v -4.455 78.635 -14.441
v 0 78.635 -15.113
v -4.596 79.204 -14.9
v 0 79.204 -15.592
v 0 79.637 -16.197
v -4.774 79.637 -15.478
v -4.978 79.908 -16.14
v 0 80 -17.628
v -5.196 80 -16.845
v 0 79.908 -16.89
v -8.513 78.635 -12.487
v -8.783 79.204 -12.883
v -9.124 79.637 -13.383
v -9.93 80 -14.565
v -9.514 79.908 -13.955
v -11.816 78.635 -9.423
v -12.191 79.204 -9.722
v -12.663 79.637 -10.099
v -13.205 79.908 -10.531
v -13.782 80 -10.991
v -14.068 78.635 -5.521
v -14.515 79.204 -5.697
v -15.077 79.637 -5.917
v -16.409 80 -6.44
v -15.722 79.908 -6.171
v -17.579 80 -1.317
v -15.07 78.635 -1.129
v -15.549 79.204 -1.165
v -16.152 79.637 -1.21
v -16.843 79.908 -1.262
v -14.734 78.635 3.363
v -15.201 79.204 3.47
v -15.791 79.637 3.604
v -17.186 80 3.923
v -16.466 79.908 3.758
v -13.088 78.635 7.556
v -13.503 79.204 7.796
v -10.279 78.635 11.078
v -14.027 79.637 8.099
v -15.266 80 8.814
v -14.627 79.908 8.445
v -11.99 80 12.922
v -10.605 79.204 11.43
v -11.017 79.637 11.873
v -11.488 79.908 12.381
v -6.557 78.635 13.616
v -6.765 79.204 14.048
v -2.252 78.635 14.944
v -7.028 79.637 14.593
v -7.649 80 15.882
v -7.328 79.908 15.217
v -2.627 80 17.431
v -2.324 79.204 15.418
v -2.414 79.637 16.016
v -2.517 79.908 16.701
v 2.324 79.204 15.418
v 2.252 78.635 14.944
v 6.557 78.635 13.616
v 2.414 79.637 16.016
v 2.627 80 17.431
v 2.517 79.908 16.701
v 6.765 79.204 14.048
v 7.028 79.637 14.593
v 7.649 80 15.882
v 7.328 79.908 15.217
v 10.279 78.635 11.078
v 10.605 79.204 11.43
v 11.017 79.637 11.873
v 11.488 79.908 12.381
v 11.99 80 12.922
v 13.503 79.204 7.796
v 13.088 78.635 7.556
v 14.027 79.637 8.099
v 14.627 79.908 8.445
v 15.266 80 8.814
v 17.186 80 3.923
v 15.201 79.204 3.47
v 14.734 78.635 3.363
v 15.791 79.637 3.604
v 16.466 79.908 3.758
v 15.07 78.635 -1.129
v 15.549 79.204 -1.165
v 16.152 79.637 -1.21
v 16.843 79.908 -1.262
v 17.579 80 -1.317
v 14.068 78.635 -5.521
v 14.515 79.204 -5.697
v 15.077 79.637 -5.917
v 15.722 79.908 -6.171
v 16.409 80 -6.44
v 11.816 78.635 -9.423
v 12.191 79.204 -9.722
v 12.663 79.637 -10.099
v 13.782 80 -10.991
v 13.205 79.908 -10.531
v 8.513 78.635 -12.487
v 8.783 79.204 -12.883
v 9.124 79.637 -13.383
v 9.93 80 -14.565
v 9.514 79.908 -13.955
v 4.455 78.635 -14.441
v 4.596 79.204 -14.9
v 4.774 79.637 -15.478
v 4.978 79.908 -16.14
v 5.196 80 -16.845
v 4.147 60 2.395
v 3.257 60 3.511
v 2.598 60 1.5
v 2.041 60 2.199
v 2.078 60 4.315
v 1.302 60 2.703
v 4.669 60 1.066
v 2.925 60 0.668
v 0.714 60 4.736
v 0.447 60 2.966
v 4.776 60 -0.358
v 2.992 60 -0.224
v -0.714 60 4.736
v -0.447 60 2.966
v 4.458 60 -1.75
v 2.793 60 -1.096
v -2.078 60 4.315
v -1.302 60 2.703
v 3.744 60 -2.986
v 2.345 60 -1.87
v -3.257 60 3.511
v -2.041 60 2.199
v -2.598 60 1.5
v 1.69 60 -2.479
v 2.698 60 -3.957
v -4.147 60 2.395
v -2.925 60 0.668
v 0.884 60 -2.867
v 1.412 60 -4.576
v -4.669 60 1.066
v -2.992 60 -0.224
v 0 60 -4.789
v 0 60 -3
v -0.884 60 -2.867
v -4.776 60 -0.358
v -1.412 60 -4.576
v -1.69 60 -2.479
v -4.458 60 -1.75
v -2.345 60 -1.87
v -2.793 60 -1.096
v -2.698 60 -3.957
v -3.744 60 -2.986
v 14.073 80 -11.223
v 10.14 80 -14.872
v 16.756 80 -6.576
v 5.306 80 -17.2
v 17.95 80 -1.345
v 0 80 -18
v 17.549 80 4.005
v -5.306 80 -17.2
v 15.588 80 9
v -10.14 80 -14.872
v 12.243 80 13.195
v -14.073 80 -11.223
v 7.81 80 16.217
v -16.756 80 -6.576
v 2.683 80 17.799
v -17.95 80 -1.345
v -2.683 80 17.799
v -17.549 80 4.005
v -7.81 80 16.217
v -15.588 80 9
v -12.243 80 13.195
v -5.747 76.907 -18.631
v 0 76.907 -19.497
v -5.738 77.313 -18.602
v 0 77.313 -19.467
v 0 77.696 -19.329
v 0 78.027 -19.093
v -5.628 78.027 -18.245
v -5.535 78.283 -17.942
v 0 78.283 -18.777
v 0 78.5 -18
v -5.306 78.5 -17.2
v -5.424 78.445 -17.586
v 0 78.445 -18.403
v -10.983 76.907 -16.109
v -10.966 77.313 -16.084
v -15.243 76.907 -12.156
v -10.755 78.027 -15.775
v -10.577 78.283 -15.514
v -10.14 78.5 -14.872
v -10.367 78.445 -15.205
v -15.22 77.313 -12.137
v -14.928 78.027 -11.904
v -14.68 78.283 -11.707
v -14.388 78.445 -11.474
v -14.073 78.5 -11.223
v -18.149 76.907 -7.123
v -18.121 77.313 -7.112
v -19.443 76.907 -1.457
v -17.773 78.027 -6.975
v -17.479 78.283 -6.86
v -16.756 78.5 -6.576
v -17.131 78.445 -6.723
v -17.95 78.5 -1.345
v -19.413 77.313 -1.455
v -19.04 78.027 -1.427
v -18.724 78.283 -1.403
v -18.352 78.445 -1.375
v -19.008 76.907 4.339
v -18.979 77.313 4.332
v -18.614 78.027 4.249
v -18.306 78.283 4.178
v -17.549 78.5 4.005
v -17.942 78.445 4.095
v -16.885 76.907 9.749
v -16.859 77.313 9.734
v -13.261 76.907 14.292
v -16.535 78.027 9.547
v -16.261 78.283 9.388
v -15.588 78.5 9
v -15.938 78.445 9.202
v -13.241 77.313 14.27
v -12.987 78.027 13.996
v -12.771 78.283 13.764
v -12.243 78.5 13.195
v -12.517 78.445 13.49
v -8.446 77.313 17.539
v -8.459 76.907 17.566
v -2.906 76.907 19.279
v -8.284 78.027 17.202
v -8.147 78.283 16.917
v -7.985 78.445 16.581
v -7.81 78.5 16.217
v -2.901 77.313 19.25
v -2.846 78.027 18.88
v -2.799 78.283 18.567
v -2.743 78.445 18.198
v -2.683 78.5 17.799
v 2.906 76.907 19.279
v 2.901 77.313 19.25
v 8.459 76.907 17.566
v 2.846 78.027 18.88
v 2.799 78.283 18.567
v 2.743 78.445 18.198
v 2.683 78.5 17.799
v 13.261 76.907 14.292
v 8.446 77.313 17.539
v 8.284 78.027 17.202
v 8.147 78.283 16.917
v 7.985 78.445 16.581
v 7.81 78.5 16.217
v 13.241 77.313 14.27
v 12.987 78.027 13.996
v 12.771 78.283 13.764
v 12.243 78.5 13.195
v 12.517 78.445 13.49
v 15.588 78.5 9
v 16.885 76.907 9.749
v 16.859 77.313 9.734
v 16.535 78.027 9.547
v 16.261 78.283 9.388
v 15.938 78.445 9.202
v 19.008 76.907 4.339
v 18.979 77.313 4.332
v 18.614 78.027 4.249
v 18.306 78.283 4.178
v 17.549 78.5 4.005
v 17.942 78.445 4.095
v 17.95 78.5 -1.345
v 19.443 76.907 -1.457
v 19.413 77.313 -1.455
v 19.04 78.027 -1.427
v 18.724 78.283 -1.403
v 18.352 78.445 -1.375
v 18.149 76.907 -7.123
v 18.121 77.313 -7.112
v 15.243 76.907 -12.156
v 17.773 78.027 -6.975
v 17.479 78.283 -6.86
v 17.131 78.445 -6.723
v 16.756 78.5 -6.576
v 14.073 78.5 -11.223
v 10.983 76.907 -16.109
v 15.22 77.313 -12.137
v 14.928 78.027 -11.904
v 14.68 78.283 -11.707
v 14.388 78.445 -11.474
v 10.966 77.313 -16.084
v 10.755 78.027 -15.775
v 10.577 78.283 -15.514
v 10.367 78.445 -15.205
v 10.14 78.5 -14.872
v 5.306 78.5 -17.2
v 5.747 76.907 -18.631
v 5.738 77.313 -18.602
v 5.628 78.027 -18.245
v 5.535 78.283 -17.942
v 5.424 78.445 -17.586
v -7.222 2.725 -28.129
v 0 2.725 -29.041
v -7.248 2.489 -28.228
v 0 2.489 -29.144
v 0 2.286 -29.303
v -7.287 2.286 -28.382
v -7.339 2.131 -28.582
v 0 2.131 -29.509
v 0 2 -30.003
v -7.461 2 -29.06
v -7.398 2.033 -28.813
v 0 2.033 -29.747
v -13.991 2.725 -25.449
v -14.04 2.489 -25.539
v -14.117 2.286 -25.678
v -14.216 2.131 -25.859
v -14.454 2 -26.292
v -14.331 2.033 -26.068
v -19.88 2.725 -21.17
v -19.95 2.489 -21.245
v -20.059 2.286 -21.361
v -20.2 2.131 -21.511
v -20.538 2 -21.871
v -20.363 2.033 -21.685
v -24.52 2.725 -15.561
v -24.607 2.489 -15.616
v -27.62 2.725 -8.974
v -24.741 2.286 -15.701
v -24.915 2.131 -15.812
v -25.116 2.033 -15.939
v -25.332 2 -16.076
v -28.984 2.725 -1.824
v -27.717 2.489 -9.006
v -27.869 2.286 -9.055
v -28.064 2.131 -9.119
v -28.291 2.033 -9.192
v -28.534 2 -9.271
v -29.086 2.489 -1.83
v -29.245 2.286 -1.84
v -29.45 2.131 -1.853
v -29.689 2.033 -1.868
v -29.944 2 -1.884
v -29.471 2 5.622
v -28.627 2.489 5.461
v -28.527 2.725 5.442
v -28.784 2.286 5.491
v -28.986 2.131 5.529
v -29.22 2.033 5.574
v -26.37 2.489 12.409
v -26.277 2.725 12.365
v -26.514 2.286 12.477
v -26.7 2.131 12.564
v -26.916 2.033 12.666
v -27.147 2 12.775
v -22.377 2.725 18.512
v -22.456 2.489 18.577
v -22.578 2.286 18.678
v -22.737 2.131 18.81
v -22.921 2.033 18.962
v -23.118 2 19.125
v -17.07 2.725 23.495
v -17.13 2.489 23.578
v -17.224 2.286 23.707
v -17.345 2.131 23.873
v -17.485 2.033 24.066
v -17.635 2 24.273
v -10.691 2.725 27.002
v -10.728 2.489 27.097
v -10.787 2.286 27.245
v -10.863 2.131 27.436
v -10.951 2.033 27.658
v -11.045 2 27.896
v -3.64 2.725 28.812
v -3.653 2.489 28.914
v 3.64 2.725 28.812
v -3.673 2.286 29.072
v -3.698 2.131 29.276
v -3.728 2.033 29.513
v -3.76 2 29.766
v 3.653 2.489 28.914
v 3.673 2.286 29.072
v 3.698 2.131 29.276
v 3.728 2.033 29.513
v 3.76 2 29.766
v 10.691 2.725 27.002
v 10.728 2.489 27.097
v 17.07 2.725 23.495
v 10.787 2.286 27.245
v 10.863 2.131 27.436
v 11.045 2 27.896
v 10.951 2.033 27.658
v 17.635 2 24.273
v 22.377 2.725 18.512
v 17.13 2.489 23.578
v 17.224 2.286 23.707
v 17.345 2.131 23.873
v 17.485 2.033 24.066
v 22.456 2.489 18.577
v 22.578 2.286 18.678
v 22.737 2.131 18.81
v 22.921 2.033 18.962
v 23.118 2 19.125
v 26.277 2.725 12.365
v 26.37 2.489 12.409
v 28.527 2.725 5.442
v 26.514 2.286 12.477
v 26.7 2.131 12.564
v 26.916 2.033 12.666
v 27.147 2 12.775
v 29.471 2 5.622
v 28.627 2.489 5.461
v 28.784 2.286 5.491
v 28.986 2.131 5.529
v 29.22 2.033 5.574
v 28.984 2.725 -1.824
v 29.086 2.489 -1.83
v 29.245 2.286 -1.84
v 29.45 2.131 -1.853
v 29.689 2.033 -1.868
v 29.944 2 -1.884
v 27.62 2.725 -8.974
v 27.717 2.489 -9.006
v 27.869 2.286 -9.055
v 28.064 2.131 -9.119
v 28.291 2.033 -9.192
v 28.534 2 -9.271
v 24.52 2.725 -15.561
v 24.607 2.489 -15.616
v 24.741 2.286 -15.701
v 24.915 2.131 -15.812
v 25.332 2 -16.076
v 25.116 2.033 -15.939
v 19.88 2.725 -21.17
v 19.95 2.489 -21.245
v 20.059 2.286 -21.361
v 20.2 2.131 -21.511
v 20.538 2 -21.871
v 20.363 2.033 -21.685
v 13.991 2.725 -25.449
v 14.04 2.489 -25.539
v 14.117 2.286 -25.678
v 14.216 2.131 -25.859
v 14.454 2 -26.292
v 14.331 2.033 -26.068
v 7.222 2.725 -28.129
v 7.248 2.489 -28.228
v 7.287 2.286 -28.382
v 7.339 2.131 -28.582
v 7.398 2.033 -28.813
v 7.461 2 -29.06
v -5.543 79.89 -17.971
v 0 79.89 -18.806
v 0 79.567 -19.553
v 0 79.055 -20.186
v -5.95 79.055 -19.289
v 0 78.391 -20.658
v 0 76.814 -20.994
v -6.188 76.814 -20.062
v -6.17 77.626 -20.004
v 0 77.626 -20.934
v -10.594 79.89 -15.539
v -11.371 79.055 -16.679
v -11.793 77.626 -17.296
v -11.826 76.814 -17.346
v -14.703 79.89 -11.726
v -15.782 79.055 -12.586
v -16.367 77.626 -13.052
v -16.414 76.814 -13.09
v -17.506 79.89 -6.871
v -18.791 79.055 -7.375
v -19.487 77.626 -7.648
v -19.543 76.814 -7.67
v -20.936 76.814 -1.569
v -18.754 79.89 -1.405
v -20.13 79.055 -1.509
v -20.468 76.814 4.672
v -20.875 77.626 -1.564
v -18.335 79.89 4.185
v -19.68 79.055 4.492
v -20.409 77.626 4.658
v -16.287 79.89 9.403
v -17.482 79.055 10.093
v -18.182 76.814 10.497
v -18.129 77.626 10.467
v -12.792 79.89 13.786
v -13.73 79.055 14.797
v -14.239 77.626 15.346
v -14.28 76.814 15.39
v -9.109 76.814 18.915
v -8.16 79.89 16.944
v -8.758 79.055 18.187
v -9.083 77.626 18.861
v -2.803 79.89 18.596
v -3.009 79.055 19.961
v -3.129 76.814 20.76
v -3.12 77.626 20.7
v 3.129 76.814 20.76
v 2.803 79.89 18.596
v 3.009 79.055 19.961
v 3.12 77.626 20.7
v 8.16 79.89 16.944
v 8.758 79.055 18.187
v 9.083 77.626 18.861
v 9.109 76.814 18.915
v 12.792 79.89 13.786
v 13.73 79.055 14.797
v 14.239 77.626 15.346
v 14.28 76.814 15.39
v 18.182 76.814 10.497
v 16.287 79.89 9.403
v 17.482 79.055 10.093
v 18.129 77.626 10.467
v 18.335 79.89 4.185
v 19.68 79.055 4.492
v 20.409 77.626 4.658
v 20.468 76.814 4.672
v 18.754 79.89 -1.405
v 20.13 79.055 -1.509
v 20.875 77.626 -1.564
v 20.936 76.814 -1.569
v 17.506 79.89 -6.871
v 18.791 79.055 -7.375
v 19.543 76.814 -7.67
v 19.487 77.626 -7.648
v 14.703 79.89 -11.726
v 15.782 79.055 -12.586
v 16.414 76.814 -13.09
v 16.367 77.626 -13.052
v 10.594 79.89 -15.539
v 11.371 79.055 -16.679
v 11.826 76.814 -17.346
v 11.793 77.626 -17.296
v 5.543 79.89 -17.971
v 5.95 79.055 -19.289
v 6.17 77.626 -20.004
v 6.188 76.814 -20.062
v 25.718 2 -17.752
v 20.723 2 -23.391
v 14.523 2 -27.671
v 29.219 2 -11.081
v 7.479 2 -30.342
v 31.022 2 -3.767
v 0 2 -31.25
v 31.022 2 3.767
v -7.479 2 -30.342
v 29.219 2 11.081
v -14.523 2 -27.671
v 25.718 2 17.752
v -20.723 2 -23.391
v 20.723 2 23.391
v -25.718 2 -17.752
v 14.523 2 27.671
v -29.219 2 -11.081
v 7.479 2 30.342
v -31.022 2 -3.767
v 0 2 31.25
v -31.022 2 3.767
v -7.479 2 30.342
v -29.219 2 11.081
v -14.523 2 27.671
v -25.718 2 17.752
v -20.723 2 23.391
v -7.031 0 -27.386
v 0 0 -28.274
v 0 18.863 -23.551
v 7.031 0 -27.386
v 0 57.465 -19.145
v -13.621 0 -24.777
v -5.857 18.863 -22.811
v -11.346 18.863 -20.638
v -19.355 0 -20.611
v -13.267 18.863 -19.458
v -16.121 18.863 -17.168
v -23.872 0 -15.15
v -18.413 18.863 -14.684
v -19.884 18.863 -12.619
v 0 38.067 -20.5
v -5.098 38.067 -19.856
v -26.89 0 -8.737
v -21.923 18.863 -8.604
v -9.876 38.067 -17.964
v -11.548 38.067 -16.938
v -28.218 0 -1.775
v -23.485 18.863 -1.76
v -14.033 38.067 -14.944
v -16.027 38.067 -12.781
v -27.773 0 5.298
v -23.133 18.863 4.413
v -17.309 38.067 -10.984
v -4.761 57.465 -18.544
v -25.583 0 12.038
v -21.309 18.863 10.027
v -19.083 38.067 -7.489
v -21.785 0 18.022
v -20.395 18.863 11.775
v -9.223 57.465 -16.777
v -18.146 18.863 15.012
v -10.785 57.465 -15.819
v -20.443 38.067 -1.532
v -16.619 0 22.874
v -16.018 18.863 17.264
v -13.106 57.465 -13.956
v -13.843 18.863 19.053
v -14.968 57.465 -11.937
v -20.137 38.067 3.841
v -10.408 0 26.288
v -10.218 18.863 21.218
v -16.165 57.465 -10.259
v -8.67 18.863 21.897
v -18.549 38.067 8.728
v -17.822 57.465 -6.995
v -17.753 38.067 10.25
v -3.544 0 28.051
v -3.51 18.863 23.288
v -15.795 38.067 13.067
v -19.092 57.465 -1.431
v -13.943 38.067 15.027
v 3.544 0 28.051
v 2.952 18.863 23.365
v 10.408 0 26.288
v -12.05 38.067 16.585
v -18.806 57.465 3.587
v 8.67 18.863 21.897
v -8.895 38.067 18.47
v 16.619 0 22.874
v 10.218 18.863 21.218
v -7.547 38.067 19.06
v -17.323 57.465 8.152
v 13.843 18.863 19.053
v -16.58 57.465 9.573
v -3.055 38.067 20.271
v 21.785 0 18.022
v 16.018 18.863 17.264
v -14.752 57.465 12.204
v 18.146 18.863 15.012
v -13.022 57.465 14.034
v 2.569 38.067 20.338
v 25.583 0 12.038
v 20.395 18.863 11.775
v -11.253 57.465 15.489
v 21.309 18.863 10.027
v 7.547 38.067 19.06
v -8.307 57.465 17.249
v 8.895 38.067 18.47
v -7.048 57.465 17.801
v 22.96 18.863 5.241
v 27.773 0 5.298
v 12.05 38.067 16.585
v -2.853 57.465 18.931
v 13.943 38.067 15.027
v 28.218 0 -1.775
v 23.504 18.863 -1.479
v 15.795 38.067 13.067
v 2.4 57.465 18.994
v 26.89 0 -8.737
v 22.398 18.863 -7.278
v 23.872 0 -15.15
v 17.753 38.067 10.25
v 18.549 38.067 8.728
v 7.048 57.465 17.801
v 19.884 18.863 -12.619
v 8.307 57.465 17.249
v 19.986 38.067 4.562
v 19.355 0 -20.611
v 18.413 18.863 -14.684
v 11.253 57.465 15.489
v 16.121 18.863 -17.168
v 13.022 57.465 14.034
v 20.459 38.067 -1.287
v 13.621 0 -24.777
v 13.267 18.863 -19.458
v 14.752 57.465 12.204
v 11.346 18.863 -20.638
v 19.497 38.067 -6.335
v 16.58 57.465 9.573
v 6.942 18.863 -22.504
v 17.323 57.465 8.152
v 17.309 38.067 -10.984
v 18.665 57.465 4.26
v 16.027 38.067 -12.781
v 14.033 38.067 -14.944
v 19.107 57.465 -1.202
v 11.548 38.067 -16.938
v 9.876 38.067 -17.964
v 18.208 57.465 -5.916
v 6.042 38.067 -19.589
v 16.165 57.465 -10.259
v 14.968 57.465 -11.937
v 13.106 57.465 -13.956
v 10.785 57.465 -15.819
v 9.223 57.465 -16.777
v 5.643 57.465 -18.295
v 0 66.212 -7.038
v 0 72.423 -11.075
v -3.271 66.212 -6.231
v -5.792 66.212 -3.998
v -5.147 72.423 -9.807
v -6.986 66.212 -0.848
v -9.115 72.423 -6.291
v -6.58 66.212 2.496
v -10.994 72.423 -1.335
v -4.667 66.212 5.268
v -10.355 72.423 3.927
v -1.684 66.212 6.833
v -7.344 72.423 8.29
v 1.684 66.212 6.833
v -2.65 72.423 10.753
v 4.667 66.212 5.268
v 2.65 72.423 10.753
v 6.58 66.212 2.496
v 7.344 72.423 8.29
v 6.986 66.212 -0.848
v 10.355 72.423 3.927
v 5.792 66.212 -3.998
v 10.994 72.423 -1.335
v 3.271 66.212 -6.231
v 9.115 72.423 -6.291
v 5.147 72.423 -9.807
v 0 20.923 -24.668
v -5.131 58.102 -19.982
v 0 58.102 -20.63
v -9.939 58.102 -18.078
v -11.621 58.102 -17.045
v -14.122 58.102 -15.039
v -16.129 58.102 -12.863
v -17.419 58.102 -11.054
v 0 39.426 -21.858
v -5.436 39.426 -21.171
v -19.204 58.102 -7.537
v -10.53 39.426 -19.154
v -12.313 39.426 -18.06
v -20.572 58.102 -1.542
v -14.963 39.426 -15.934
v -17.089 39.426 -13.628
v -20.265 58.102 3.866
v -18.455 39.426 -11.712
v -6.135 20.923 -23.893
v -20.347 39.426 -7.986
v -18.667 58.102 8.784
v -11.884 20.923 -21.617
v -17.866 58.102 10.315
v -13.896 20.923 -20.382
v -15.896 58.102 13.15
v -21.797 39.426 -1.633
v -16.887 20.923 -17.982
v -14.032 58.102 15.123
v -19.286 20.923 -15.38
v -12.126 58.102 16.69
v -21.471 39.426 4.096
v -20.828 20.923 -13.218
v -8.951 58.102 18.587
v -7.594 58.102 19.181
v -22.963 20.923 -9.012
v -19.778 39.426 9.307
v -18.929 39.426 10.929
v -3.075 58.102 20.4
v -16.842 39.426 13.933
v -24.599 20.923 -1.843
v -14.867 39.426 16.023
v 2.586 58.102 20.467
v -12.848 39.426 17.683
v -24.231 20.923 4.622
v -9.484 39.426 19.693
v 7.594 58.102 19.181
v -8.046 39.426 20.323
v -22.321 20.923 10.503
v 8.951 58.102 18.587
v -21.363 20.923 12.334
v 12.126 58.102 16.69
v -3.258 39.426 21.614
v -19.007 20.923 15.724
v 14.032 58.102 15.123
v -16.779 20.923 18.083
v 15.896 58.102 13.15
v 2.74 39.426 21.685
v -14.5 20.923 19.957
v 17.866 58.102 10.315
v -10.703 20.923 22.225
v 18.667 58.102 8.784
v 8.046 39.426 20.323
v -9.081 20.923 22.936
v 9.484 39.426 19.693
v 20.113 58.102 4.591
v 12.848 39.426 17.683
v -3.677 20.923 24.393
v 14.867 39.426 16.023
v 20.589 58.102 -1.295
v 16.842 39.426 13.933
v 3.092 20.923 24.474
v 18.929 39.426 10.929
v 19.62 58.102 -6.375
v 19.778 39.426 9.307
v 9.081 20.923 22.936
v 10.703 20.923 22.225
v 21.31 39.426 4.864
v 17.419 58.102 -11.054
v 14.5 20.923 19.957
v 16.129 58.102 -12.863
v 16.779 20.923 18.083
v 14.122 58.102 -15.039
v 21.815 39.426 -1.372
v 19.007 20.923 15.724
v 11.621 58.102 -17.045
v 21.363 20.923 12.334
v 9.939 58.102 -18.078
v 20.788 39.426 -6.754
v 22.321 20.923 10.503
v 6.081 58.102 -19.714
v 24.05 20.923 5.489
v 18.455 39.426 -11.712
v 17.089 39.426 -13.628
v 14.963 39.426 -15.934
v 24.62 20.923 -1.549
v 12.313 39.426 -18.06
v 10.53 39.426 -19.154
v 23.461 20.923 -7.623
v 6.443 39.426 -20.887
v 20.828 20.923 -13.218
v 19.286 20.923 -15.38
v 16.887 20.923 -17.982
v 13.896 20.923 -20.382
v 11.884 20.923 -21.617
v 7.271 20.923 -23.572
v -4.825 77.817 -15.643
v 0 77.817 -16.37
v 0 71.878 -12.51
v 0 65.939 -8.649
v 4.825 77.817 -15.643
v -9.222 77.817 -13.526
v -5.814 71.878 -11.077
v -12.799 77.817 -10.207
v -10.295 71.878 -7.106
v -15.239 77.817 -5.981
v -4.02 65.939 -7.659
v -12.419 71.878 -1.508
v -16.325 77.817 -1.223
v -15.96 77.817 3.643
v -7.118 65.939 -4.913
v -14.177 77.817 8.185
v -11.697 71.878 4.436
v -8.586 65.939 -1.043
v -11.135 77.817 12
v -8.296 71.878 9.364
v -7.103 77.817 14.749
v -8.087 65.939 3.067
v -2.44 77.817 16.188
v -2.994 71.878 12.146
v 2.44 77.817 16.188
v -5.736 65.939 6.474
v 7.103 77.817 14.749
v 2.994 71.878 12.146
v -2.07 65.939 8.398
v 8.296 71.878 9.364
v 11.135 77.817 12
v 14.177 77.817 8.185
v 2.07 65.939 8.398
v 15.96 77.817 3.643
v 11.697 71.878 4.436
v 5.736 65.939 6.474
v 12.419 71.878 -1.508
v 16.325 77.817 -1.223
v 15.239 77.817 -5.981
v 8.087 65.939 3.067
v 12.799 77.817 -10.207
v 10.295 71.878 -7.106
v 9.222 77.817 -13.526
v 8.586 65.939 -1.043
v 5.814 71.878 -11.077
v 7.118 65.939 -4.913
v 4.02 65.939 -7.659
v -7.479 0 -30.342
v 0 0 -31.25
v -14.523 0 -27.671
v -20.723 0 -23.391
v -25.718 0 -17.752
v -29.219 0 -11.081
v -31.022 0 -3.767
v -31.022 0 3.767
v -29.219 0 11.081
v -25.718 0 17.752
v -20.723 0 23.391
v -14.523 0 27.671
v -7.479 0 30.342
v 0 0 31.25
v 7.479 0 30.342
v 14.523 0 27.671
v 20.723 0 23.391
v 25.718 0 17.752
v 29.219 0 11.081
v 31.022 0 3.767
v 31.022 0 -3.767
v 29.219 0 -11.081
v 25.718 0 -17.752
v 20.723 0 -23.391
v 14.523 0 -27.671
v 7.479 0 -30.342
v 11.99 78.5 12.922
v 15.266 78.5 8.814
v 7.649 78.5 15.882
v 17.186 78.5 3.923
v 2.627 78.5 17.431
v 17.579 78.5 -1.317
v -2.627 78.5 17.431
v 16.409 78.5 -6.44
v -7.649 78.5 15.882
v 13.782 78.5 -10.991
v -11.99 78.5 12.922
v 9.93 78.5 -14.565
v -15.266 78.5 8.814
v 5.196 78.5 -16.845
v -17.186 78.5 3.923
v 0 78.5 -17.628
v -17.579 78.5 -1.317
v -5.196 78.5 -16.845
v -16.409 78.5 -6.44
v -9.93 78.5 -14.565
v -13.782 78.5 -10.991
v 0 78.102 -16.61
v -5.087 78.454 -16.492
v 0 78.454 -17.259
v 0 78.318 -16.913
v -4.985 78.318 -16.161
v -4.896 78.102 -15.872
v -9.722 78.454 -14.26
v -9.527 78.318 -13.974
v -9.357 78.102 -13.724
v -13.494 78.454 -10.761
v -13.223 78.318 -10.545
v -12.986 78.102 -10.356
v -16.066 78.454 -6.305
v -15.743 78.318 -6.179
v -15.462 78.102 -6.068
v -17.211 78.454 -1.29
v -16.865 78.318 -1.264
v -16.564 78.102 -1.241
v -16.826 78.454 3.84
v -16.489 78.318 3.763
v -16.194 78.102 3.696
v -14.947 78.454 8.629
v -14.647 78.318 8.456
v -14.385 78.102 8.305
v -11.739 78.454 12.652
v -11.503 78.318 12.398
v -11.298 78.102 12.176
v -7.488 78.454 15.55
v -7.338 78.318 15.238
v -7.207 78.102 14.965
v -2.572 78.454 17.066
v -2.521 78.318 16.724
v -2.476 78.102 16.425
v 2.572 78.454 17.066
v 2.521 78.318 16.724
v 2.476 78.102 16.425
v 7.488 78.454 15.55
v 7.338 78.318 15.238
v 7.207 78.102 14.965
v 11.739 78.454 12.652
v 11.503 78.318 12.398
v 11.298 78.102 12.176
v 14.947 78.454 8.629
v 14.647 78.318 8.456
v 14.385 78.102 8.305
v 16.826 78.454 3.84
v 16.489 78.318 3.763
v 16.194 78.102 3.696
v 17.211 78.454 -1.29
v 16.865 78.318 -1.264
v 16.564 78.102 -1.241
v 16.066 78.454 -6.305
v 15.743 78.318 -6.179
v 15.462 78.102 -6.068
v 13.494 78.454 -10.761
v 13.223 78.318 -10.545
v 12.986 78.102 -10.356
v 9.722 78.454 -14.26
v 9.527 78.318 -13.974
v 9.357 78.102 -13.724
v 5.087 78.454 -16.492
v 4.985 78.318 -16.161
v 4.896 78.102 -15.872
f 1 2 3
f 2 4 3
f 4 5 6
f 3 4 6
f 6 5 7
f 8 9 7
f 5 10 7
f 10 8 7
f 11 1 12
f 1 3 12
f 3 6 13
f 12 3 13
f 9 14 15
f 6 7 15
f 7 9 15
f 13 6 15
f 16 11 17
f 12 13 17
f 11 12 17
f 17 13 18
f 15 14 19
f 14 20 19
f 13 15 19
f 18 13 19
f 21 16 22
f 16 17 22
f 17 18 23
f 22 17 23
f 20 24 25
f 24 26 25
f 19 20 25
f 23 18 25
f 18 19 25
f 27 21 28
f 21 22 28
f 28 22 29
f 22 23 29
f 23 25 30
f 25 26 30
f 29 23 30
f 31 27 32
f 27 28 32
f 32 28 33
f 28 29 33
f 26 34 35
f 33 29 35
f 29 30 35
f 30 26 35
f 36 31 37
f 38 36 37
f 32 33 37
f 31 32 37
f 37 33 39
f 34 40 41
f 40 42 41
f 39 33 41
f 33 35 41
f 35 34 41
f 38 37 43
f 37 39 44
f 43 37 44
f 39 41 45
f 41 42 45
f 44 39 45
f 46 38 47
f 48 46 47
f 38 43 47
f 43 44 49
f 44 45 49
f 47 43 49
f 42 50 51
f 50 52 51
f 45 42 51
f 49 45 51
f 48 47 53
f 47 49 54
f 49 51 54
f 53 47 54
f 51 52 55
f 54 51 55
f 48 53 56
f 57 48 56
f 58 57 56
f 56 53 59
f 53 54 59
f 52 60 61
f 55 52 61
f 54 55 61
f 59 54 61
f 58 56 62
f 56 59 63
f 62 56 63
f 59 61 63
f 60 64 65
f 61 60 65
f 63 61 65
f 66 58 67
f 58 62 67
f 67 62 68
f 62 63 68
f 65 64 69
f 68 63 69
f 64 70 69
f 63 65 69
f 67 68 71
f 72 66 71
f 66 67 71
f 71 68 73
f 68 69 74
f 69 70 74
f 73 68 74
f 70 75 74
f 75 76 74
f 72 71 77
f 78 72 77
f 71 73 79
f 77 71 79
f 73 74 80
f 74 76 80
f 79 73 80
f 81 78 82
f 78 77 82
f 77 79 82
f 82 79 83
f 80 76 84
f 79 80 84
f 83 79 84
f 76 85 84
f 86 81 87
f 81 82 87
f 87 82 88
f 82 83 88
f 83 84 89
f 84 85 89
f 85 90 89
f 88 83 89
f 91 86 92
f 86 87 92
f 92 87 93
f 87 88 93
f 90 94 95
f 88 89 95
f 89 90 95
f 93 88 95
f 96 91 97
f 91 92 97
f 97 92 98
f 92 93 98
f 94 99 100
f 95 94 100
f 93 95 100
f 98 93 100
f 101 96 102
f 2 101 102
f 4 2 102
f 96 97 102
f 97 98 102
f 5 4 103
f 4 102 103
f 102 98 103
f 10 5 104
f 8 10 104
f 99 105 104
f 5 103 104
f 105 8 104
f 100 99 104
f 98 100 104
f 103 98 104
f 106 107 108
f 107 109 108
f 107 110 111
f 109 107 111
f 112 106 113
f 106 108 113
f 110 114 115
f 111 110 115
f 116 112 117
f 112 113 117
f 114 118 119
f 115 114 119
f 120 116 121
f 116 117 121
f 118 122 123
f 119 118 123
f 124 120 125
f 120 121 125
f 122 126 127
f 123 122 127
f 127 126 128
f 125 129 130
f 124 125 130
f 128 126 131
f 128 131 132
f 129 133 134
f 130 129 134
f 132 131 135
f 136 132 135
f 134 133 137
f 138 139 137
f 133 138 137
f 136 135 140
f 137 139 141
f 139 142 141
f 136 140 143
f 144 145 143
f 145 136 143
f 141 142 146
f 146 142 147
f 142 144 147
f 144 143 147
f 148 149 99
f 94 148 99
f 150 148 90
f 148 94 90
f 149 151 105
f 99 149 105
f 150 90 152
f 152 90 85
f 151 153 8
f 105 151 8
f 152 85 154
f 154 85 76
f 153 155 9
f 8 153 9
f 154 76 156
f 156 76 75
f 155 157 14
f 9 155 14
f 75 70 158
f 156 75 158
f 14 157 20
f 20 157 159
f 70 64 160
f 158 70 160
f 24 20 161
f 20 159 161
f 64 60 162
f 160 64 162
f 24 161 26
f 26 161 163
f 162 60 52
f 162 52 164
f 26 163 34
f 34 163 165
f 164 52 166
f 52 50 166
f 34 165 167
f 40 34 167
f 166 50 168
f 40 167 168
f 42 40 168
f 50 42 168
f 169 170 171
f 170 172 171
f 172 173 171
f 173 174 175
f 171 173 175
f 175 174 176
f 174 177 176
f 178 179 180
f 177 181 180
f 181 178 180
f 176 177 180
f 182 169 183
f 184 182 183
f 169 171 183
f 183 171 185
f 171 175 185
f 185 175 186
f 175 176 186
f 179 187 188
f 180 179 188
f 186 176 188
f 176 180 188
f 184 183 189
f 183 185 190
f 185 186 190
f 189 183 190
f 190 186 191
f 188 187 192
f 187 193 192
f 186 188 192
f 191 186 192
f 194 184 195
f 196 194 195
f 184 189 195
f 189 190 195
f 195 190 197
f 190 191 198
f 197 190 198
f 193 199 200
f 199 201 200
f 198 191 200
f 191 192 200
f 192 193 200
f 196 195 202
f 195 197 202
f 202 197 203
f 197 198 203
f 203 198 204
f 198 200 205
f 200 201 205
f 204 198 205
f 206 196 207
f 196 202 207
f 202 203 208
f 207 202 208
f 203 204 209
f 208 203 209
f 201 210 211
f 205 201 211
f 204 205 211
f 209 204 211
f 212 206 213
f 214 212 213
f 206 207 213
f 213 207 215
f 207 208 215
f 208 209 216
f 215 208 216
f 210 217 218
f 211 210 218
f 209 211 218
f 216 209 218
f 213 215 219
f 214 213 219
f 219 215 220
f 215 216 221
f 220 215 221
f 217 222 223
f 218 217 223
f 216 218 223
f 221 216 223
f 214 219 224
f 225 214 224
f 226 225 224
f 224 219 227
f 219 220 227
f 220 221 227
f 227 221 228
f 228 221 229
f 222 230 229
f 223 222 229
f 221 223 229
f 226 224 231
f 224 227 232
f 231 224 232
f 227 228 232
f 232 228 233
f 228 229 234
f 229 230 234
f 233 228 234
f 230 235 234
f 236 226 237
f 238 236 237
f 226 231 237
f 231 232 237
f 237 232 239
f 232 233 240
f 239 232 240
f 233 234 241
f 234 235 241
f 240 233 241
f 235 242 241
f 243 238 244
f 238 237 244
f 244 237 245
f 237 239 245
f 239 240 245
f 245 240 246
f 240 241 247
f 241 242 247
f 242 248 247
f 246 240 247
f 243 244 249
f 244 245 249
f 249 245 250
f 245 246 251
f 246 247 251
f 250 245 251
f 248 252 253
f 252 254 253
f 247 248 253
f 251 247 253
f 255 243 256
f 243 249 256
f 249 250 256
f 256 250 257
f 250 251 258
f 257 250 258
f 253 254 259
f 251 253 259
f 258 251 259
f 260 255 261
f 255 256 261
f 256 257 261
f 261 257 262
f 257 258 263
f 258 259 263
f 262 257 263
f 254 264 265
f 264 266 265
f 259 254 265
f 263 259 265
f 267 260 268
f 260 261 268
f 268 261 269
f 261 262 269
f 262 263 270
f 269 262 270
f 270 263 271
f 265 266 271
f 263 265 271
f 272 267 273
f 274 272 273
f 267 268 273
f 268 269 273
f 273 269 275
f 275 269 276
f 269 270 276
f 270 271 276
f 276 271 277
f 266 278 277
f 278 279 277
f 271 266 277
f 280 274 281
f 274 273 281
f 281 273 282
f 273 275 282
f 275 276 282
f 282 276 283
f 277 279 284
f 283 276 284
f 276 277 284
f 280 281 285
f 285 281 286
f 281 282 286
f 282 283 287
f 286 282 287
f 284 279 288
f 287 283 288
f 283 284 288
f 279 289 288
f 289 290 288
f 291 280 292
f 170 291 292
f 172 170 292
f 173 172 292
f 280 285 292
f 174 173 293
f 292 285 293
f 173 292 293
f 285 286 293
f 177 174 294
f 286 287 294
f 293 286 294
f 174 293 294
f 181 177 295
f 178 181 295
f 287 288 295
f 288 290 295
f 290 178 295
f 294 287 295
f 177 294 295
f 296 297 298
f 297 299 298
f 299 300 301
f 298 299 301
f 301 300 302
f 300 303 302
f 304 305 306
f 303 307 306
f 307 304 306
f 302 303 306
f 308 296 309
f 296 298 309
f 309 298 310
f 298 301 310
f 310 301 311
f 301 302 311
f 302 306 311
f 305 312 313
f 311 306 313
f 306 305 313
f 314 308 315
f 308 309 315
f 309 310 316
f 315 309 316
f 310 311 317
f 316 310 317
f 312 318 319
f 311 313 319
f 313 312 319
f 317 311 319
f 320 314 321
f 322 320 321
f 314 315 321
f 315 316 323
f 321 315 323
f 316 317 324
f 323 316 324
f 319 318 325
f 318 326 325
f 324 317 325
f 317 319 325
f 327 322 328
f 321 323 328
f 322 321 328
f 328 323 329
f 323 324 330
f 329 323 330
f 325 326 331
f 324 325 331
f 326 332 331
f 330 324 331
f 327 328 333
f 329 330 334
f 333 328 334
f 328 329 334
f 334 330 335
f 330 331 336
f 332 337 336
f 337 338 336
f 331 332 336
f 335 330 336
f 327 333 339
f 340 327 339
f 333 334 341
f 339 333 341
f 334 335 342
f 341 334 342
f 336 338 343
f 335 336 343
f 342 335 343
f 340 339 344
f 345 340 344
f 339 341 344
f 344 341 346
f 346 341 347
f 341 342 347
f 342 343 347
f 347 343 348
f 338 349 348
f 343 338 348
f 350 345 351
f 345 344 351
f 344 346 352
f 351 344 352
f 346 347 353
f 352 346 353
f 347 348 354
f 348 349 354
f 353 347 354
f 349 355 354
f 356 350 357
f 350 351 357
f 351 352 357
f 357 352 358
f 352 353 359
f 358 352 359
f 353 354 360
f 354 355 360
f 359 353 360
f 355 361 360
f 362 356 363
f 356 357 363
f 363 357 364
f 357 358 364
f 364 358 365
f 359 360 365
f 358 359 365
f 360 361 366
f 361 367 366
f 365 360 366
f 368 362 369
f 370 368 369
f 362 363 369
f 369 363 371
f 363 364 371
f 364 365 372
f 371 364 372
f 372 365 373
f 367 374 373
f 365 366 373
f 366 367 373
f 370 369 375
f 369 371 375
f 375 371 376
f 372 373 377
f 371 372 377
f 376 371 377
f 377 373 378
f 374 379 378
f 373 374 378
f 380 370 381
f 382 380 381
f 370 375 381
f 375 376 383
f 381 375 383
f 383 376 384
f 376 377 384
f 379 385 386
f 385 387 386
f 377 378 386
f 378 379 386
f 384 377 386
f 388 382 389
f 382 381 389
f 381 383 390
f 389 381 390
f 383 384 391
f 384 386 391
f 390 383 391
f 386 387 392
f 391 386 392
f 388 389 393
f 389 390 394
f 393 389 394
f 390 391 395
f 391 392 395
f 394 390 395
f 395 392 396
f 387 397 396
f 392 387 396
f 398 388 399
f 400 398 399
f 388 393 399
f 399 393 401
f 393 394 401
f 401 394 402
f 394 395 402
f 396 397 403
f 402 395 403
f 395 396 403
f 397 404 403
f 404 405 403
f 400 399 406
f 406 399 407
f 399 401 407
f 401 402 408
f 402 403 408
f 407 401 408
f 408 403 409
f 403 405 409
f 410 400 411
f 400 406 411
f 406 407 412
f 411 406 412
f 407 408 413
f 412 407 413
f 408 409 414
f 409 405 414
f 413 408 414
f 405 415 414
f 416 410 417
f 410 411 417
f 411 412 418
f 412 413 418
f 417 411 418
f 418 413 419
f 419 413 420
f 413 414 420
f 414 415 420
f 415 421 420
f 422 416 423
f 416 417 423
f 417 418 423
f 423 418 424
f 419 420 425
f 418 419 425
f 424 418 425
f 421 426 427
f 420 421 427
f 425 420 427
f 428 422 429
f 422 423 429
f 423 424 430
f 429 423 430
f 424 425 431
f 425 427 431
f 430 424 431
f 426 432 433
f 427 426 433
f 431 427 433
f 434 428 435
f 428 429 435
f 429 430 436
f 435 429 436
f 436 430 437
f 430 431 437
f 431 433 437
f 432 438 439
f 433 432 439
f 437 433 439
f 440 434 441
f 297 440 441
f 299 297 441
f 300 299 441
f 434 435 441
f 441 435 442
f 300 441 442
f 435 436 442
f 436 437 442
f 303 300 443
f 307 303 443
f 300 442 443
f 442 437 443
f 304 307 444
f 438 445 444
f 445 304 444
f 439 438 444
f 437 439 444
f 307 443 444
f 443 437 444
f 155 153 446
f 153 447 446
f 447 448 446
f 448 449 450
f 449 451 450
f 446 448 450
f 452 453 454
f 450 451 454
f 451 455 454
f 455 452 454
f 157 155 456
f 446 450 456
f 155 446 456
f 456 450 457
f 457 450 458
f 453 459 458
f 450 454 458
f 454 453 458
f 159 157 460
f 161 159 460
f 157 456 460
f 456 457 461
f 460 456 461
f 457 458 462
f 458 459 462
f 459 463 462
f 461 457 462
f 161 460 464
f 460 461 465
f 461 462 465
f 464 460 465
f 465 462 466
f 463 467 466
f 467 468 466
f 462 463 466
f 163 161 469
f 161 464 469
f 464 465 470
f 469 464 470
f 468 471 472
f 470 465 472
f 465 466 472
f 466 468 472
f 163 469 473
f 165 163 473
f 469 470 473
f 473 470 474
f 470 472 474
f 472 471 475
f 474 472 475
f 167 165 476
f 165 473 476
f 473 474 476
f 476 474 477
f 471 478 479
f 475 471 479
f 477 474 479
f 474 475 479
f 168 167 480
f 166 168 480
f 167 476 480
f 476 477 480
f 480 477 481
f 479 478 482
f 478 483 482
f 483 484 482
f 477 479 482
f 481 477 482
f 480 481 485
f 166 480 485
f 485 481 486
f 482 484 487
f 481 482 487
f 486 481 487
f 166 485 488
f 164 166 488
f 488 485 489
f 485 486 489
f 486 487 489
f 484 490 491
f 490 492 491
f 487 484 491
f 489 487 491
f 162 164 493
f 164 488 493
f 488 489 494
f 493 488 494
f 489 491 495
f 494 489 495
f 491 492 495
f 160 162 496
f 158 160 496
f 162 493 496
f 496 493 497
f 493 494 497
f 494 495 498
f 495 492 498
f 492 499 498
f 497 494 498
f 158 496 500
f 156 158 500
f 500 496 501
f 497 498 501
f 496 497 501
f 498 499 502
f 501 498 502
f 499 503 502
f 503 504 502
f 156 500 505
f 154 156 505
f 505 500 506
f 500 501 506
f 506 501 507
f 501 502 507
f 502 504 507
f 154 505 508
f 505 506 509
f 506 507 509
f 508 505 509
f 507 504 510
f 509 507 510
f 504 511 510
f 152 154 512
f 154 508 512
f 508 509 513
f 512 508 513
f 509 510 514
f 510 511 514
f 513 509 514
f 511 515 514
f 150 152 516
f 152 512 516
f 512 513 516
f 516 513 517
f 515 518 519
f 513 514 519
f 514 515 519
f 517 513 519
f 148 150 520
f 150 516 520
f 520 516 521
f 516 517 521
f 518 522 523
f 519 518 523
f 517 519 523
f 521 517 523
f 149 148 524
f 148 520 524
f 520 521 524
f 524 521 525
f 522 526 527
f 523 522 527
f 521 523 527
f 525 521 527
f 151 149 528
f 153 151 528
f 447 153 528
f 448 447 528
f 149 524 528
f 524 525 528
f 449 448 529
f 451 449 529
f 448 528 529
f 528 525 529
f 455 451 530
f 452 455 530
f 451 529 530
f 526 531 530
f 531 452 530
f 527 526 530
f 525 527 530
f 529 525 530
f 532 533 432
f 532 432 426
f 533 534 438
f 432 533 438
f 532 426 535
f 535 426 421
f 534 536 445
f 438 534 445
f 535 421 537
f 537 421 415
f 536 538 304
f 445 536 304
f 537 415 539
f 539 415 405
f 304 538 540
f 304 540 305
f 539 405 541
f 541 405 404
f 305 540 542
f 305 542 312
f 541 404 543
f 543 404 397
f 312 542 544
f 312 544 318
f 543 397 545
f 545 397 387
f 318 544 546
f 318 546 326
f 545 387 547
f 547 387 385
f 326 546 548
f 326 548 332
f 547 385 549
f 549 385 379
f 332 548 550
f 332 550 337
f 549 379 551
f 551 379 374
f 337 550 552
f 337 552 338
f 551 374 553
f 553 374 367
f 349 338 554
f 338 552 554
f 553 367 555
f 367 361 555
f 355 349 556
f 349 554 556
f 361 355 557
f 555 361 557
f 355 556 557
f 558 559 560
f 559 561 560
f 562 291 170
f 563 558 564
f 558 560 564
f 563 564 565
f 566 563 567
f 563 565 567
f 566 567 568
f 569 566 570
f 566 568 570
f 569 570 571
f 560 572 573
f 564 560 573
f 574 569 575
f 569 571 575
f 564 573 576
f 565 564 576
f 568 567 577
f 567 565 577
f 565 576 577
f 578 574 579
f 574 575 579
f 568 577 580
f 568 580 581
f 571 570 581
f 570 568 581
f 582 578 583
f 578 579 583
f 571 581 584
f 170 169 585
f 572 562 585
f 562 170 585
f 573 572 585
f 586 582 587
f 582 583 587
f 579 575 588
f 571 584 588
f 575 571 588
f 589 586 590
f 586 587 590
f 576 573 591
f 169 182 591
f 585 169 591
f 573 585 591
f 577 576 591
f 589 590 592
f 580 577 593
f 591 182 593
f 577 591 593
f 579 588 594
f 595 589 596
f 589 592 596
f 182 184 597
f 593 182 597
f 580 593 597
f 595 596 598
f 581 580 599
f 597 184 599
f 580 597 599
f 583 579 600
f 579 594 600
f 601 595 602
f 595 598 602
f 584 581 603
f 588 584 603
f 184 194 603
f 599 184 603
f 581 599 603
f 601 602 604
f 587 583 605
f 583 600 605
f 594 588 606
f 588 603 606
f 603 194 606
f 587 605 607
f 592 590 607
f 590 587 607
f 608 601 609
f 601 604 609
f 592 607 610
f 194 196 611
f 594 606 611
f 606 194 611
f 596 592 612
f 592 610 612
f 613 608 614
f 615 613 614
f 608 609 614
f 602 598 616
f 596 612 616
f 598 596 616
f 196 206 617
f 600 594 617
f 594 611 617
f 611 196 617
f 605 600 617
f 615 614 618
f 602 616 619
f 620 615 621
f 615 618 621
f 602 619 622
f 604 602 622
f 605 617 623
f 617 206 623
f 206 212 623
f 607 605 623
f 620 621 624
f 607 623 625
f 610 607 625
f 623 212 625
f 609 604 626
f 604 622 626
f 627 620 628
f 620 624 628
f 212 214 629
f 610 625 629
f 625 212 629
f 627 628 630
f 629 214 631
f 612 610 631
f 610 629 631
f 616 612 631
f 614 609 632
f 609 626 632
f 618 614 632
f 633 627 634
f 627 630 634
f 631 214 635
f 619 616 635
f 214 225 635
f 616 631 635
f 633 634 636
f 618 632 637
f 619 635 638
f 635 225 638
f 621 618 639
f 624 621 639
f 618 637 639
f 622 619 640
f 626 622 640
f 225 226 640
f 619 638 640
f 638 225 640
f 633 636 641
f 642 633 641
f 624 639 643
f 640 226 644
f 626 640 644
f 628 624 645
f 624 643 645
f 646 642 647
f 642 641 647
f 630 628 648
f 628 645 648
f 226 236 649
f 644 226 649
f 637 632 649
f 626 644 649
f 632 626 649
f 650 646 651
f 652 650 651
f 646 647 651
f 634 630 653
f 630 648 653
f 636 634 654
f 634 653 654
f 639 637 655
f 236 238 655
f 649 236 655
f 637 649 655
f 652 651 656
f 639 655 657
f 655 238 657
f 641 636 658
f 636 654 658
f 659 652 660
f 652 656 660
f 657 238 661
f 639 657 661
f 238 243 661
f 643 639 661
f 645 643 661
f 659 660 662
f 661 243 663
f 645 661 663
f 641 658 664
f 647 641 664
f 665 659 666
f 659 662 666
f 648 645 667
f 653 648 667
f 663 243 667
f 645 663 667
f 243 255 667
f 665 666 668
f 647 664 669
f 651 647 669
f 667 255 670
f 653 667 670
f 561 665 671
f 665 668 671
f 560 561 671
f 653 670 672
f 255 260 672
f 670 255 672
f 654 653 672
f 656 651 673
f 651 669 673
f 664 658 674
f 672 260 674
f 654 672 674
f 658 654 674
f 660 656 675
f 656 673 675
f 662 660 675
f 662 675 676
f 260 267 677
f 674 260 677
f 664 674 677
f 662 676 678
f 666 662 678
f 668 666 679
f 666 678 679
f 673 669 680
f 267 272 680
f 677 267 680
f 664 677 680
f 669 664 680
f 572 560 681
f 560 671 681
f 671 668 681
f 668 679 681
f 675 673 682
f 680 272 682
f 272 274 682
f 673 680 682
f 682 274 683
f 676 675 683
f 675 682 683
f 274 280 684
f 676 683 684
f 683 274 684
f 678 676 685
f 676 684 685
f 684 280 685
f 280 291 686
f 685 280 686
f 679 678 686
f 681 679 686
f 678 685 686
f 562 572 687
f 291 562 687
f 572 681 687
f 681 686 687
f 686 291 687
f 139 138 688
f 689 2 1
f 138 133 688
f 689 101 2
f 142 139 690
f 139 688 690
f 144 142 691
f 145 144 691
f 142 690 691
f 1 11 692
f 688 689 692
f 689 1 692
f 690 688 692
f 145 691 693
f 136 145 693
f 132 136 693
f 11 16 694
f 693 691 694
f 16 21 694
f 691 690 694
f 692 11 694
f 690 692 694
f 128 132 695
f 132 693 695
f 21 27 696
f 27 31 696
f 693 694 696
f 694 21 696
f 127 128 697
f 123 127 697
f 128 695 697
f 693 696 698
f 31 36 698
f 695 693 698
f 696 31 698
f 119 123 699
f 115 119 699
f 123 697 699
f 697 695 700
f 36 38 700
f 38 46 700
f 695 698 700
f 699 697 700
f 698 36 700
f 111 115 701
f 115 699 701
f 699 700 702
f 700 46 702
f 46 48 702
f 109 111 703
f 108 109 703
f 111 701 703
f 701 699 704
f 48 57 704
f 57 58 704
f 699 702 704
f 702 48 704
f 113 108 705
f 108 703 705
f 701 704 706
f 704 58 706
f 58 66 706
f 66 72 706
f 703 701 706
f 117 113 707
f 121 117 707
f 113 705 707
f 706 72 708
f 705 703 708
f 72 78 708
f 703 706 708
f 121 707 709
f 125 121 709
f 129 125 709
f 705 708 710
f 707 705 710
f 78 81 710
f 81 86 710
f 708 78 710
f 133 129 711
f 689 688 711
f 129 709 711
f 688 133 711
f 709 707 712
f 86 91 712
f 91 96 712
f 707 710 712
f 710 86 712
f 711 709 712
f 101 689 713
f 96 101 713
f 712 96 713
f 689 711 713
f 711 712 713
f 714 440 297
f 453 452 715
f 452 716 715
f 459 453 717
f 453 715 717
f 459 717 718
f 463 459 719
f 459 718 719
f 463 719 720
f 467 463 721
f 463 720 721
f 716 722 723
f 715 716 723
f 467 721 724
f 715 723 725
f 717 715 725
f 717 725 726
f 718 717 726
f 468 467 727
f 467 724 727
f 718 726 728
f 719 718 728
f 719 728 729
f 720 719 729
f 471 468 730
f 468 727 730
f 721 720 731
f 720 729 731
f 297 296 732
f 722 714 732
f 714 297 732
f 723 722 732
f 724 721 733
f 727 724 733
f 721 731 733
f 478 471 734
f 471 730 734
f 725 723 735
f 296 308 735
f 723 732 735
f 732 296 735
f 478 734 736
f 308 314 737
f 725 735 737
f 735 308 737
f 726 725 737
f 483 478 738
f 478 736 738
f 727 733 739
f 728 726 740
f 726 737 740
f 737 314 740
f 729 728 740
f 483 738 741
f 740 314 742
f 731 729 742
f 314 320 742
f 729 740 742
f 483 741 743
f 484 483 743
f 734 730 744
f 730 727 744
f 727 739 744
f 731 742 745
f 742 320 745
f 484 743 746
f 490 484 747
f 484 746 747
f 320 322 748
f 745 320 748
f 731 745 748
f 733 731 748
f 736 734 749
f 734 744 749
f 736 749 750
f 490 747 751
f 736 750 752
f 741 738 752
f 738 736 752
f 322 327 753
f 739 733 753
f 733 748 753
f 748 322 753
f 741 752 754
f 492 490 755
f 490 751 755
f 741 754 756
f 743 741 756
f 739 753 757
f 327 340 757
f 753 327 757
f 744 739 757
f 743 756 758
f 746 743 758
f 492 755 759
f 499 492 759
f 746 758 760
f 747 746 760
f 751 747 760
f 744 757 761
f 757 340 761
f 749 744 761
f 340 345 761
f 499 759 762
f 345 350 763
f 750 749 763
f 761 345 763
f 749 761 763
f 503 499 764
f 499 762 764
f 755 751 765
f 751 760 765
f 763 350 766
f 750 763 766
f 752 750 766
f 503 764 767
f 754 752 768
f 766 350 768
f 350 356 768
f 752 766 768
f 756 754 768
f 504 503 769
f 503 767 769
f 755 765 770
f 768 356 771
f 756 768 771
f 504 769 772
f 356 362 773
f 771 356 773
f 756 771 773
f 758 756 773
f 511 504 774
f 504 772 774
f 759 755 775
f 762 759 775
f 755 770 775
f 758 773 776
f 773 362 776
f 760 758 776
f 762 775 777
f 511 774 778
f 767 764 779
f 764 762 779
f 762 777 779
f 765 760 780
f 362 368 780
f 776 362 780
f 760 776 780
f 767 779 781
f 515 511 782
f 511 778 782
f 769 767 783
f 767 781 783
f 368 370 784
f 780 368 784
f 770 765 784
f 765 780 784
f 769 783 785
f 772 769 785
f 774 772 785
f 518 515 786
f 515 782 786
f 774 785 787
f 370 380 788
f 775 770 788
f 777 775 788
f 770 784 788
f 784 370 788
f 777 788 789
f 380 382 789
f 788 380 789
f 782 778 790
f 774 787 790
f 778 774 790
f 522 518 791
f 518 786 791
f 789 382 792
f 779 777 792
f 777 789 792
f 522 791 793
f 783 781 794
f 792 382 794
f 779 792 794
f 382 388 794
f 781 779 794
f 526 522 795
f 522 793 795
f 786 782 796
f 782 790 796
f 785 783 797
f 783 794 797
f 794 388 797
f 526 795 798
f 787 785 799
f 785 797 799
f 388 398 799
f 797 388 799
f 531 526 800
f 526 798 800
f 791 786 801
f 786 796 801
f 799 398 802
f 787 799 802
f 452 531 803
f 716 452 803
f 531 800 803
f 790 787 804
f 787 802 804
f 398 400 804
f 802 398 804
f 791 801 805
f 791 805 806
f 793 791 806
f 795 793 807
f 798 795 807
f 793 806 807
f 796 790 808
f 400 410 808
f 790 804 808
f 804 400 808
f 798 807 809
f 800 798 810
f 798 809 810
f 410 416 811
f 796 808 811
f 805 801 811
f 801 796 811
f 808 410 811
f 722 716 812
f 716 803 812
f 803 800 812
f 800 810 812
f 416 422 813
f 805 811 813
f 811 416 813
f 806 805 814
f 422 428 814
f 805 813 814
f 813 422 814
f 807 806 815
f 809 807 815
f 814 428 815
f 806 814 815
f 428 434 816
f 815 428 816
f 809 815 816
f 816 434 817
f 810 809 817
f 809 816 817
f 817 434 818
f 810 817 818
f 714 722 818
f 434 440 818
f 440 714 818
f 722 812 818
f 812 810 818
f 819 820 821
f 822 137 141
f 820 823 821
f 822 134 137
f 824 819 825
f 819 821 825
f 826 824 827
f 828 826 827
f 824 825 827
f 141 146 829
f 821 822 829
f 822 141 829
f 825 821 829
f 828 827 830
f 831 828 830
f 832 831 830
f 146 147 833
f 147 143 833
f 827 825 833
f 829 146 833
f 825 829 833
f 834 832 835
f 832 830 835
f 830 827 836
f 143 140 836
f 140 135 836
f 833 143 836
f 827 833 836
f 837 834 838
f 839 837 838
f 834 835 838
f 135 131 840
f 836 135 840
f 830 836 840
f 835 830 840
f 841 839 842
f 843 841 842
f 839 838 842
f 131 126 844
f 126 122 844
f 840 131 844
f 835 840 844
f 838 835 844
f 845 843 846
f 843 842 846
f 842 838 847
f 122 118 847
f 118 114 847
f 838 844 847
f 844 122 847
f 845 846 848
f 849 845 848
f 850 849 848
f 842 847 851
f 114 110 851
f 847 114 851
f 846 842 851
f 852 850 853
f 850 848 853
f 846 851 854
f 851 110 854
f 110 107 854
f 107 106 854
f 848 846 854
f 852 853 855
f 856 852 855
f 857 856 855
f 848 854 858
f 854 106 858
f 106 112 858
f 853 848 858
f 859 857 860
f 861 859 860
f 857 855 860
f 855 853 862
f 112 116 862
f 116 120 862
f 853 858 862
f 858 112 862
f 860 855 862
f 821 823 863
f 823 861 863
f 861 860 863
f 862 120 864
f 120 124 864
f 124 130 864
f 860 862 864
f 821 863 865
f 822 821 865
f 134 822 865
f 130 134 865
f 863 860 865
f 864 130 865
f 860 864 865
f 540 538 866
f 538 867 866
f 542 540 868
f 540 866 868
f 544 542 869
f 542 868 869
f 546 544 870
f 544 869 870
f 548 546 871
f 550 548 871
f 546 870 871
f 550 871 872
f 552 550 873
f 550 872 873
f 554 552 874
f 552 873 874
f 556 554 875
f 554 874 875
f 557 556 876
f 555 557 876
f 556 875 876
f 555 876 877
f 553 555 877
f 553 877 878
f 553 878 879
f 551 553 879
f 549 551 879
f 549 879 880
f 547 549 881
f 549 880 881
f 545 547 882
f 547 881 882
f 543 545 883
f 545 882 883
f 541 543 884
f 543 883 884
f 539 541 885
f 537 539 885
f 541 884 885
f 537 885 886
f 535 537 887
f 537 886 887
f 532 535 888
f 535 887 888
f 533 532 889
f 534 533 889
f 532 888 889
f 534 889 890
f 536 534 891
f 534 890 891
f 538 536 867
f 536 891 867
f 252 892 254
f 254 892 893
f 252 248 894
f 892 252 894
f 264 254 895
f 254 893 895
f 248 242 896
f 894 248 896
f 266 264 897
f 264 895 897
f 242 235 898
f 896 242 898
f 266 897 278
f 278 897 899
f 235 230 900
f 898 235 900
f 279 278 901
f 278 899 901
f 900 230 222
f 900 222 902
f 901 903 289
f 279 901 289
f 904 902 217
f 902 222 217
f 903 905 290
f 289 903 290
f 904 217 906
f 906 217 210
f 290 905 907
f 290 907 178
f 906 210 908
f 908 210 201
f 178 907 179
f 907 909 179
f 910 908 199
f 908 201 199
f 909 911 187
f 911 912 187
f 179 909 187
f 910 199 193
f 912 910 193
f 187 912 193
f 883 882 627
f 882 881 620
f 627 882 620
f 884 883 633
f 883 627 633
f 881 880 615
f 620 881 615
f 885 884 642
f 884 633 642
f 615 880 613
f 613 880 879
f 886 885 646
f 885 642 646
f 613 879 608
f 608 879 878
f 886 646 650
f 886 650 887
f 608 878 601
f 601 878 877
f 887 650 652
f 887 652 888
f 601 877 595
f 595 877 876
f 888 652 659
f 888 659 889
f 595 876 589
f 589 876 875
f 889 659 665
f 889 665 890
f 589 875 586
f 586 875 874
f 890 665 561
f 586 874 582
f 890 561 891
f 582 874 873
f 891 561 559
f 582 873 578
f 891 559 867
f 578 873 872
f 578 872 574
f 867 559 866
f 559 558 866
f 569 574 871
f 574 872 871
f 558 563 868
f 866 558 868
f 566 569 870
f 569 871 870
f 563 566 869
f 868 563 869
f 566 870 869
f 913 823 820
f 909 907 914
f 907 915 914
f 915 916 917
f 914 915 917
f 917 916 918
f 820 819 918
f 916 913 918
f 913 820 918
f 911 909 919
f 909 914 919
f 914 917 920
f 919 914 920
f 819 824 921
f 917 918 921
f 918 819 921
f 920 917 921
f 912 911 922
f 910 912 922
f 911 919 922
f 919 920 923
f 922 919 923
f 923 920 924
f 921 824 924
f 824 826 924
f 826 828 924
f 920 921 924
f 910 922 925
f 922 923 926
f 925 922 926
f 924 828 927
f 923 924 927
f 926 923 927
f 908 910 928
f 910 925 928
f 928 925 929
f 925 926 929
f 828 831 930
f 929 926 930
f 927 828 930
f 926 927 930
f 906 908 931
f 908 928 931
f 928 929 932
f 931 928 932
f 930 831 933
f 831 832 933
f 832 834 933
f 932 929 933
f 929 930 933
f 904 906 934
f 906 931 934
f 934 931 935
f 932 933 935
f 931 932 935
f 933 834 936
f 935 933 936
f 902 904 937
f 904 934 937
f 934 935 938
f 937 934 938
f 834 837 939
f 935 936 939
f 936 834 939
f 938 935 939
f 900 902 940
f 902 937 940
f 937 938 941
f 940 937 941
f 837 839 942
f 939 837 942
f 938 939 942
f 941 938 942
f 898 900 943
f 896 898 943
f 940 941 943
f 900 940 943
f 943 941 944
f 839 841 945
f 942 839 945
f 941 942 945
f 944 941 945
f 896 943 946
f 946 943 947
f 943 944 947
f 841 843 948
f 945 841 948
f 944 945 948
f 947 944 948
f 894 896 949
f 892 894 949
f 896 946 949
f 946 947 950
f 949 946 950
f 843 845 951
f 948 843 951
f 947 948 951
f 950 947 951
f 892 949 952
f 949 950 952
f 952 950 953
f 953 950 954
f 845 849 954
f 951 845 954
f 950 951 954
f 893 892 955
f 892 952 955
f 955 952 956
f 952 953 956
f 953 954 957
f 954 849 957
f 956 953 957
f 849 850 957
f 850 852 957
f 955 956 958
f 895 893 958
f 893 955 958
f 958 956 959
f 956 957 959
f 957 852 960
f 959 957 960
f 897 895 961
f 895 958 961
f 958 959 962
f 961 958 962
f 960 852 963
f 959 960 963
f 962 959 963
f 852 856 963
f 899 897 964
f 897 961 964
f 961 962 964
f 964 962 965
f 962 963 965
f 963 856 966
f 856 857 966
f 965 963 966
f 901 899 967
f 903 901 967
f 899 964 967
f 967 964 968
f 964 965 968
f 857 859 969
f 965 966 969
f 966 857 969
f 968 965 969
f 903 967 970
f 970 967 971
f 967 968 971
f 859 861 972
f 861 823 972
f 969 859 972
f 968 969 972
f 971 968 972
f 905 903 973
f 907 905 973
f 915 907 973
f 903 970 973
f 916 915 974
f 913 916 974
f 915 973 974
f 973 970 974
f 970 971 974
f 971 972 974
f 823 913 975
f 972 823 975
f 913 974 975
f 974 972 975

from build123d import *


with BuildPart() as part:
    # Esquisse1 → Révolution3 (revolve)
    with BuildSketch(Plane(origin=(0, 0, 0), x_dir=(0, 0, -1), z_dir=(1, 0, 0))):
        with BuildLine():
            Line((31.25, 0), (28.273835099, 0))
            ThreePointArc((28.273835099, 0), (20.499905423, 38.067161735), (19.497117554, 76.90705362))
            ThreePointArc((19.497117554, 76.90705362), (19.093027806, 78.027273194), (18, 78.5))
            Line((18, 78.5), (17.628058133, 78.5))
            ThreePointArc((17.628058133, 78.5), (16.912594573, 78.318374717), (16.370392708, 77.817482526))
            Line((16.370392708, 77.817482526), (4.789029066, 60))
            Line((4.789029066, 60), (3, 60))
            Line((3, 60), (15.112727284, 78.634965052))
            ThreePointArc((15.112727284, 78.634965052), (16.197131013, 79.636749434), (17.628058133, 80))
            Line((17.628058133, 80), (18, 80))
            ThreePointArc((18, 80), (20.186055613, 79.054546388), (20.994235108, 76.814107239))
            ThreePointArc((20.994235108, 76.814107239), (21.857795657, 39.426427354), (29.041387811, 2.725196477))
            ThreePointArc((29.041387811, 2.725196477), (29.400726908, 2.201625551), (30.002888214, 2))
            Line((30.002888214, 2), (31.25, 2))
            Line((31.25, 2), (31.25, 0))
        make_face()
    revolve(axis=Axis((0, 0, 0), (0, 1, 0)))


solid = part.part
